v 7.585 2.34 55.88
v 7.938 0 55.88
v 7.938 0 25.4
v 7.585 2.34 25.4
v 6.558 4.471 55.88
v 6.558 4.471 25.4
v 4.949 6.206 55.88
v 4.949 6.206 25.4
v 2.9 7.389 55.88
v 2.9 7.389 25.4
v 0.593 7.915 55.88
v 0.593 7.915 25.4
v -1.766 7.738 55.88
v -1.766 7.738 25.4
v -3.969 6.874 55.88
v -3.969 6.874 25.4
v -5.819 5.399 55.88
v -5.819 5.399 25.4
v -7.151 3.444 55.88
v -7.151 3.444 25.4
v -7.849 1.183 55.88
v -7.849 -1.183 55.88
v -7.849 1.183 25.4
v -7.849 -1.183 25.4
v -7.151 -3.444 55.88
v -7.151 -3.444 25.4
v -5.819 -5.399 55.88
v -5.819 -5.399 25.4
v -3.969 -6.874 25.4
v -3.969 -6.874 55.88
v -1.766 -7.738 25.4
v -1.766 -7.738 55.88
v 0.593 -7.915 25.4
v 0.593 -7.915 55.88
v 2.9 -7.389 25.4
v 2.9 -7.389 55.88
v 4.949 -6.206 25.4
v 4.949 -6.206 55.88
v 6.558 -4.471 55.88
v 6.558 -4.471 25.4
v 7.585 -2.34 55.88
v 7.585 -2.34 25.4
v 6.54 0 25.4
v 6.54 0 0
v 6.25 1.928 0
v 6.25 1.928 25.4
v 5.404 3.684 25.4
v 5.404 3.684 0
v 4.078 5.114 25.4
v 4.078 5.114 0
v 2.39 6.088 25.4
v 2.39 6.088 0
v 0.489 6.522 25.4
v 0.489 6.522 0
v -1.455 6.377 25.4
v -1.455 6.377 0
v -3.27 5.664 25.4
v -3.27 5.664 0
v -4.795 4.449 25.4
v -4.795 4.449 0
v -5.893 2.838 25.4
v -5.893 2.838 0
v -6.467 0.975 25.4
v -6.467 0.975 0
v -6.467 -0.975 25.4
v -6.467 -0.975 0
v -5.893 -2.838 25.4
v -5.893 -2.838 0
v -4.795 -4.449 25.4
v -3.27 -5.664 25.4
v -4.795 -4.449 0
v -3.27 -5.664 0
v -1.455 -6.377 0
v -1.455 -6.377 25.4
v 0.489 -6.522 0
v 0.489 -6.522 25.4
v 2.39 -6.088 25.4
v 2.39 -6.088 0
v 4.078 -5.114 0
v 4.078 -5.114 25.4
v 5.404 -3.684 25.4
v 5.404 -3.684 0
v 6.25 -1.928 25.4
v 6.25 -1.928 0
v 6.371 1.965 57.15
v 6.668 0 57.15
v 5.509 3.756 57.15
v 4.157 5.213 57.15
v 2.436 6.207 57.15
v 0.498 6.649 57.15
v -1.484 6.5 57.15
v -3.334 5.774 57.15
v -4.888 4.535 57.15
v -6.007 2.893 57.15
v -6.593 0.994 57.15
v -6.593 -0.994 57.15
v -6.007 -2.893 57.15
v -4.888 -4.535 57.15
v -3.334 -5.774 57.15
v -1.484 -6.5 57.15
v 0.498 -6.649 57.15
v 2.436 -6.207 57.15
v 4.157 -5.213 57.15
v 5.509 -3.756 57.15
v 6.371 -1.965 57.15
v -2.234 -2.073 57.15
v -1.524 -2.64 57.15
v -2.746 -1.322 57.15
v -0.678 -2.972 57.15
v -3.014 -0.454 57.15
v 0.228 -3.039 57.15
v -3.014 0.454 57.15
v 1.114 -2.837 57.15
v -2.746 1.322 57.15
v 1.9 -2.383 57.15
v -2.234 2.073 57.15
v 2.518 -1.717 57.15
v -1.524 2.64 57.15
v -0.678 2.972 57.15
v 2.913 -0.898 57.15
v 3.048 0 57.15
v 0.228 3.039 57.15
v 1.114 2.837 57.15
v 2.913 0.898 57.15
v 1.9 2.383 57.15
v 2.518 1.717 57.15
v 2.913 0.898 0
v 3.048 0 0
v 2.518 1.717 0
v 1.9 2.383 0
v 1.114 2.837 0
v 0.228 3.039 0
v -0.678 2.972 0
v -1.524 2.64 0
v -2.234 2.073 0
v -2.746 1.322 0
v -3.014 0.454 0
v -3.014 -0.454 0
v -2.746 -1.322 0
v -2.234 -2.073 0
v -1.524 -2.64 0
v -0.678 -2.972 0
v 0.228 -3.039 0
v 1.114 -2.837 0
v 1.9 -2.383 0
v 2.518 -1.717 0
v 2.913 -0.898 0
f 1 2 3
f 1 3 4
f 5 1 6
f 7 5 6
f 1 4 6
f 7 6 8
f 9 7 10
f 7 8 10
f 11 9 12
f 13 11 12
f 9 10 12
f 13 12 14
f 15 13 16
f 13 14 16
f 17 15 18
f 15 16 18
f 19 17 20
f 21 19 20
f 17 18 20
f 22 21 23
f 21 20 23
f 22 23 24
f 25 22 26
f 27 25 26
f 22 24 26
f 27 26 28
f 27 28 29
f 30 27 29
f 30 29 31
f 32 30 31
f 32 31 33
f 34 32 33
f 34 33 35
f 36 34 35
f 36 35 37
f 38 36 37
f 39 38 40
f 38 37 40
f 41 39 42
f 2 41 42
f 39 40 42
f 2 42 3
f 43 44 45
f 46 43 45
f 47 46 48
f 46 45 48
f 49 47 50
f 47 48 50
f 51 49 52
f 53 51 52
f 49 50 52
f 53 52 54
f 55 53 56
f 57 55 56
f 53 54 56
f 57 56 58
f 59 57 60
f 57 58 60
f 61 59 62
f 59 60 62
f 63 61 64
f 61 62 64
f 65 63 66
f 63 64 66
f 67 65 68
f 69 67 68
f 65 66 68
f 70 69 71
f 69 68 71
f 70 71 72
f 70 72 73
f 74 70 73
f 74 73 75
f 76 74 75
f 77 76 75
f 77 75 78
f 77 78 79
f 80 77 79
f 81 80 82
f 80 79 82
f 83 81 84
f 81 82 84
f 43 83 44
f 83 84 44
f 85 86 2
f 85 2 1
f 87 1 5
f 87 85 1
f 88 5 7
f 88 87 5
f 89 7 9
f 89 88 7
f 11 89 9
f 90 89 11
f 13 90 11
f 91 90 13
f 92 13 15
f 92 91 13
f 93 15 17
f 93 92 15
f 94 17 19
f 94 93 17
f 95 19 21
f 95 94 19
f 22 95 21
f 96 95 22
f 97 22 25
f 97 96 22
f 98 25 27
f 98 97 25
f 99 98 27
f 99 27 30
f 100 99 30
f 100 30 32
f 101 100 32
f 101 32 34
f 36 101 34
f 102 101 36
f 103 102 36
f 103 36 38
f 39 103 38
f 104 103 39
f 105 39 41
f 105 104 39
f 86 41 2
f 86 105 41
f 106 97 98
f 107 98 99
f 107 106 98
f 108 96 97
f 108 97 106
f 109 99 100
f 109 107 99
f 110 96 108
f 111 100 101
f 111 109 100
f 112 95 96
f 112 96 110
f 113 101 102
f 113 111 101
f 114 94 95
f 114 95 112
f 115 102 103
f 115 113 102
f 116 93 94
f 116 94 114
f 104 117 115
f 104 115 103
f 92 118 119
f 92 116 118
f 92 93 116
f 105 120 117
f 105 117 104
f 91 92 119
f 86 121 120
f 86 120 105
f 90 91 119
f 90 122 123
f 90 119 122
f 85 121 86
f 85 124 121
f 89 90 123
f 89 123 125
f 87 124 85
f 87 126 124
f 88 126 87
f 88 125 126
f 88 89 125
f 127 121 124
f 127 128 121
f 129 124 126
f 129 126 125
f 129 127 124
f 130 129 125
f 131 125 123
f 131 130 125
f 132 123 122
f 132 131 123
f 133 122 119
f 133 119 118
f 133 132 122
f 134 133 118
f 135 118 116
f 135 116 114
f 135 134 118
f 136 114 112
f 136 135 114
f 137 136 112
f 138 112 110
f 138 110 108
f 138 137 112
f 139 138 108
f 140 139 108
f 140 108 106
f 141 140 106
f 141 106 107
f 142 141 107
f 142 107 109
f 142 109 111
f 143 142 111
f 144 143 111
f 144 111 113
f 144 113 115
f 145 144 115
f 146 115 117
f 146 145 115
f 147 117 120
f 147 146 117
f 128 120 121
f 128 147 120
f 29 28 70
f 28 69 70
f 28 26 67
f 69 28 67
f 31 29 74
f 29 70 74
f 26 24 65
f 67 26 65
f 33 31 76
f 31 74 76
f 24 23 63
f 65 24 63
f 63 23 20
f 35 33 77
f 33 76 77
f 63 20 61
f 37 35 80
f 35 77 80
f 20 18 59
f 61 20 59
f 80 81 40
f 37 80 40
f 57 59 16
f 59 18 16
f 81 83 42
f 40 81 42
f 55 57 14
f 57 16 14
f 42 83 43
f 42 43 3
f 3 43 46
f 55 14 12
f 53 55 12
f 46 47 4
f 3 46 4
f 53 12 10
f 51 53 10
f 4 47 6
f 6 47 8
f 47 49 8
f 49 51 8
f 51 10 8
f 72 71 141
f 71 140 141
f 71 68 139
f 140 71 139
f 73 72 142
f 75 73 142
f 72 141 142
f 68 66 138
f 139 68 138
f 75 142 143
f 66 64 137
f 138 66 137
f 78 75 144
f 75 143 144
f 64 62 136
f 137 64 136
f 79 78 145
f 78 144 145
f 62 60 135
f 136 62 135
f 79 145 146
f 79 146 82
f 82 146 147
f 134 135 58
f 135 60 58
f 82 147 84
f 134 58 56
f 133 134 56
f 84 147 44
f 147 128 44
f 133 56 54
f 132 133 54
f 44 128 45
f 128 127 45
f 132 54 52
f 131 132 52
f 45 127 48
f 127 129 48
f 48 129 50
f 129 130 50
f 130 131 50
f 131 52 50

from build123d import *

# Parameters (mm, degrees)
F0_R     = 6.5405
F0_R_2   = 3.048
F1_DEPTH = 25.4
F3_START = 25.4
F2_R     = 7.9375
F2_R_2   = 3.048
F3_DEPTH = 31.75
F4_SIZE  = 1.27


with BuildPart() as f1:
    # F0 (on Top) → F1 (new body)
    with BuildSketch(Plane.XY):
        Circle(F0_R)
        Circle(F0_R_2, mode=Mode.SUBTRACT)
    extrude(amount=F1_DEPTH)

    # F2 (on Top) → F3 (join)
    with BuildSketch(Plane.XY.offset(F3_START)):
        Circle(F2_R)
        Circle(F2_R_2, mode=Mode.SUBTRACT)
    extrude(amount=F3_DEPTH)

    # F4
    f4_edges = [f1.edges().sort_by_distance(p)[0] for p in [
        (-7.9375, 0, 57.15),
    ]]
    chamfer(f4_edges, length=F4_SIZE)


solid = f1.part
